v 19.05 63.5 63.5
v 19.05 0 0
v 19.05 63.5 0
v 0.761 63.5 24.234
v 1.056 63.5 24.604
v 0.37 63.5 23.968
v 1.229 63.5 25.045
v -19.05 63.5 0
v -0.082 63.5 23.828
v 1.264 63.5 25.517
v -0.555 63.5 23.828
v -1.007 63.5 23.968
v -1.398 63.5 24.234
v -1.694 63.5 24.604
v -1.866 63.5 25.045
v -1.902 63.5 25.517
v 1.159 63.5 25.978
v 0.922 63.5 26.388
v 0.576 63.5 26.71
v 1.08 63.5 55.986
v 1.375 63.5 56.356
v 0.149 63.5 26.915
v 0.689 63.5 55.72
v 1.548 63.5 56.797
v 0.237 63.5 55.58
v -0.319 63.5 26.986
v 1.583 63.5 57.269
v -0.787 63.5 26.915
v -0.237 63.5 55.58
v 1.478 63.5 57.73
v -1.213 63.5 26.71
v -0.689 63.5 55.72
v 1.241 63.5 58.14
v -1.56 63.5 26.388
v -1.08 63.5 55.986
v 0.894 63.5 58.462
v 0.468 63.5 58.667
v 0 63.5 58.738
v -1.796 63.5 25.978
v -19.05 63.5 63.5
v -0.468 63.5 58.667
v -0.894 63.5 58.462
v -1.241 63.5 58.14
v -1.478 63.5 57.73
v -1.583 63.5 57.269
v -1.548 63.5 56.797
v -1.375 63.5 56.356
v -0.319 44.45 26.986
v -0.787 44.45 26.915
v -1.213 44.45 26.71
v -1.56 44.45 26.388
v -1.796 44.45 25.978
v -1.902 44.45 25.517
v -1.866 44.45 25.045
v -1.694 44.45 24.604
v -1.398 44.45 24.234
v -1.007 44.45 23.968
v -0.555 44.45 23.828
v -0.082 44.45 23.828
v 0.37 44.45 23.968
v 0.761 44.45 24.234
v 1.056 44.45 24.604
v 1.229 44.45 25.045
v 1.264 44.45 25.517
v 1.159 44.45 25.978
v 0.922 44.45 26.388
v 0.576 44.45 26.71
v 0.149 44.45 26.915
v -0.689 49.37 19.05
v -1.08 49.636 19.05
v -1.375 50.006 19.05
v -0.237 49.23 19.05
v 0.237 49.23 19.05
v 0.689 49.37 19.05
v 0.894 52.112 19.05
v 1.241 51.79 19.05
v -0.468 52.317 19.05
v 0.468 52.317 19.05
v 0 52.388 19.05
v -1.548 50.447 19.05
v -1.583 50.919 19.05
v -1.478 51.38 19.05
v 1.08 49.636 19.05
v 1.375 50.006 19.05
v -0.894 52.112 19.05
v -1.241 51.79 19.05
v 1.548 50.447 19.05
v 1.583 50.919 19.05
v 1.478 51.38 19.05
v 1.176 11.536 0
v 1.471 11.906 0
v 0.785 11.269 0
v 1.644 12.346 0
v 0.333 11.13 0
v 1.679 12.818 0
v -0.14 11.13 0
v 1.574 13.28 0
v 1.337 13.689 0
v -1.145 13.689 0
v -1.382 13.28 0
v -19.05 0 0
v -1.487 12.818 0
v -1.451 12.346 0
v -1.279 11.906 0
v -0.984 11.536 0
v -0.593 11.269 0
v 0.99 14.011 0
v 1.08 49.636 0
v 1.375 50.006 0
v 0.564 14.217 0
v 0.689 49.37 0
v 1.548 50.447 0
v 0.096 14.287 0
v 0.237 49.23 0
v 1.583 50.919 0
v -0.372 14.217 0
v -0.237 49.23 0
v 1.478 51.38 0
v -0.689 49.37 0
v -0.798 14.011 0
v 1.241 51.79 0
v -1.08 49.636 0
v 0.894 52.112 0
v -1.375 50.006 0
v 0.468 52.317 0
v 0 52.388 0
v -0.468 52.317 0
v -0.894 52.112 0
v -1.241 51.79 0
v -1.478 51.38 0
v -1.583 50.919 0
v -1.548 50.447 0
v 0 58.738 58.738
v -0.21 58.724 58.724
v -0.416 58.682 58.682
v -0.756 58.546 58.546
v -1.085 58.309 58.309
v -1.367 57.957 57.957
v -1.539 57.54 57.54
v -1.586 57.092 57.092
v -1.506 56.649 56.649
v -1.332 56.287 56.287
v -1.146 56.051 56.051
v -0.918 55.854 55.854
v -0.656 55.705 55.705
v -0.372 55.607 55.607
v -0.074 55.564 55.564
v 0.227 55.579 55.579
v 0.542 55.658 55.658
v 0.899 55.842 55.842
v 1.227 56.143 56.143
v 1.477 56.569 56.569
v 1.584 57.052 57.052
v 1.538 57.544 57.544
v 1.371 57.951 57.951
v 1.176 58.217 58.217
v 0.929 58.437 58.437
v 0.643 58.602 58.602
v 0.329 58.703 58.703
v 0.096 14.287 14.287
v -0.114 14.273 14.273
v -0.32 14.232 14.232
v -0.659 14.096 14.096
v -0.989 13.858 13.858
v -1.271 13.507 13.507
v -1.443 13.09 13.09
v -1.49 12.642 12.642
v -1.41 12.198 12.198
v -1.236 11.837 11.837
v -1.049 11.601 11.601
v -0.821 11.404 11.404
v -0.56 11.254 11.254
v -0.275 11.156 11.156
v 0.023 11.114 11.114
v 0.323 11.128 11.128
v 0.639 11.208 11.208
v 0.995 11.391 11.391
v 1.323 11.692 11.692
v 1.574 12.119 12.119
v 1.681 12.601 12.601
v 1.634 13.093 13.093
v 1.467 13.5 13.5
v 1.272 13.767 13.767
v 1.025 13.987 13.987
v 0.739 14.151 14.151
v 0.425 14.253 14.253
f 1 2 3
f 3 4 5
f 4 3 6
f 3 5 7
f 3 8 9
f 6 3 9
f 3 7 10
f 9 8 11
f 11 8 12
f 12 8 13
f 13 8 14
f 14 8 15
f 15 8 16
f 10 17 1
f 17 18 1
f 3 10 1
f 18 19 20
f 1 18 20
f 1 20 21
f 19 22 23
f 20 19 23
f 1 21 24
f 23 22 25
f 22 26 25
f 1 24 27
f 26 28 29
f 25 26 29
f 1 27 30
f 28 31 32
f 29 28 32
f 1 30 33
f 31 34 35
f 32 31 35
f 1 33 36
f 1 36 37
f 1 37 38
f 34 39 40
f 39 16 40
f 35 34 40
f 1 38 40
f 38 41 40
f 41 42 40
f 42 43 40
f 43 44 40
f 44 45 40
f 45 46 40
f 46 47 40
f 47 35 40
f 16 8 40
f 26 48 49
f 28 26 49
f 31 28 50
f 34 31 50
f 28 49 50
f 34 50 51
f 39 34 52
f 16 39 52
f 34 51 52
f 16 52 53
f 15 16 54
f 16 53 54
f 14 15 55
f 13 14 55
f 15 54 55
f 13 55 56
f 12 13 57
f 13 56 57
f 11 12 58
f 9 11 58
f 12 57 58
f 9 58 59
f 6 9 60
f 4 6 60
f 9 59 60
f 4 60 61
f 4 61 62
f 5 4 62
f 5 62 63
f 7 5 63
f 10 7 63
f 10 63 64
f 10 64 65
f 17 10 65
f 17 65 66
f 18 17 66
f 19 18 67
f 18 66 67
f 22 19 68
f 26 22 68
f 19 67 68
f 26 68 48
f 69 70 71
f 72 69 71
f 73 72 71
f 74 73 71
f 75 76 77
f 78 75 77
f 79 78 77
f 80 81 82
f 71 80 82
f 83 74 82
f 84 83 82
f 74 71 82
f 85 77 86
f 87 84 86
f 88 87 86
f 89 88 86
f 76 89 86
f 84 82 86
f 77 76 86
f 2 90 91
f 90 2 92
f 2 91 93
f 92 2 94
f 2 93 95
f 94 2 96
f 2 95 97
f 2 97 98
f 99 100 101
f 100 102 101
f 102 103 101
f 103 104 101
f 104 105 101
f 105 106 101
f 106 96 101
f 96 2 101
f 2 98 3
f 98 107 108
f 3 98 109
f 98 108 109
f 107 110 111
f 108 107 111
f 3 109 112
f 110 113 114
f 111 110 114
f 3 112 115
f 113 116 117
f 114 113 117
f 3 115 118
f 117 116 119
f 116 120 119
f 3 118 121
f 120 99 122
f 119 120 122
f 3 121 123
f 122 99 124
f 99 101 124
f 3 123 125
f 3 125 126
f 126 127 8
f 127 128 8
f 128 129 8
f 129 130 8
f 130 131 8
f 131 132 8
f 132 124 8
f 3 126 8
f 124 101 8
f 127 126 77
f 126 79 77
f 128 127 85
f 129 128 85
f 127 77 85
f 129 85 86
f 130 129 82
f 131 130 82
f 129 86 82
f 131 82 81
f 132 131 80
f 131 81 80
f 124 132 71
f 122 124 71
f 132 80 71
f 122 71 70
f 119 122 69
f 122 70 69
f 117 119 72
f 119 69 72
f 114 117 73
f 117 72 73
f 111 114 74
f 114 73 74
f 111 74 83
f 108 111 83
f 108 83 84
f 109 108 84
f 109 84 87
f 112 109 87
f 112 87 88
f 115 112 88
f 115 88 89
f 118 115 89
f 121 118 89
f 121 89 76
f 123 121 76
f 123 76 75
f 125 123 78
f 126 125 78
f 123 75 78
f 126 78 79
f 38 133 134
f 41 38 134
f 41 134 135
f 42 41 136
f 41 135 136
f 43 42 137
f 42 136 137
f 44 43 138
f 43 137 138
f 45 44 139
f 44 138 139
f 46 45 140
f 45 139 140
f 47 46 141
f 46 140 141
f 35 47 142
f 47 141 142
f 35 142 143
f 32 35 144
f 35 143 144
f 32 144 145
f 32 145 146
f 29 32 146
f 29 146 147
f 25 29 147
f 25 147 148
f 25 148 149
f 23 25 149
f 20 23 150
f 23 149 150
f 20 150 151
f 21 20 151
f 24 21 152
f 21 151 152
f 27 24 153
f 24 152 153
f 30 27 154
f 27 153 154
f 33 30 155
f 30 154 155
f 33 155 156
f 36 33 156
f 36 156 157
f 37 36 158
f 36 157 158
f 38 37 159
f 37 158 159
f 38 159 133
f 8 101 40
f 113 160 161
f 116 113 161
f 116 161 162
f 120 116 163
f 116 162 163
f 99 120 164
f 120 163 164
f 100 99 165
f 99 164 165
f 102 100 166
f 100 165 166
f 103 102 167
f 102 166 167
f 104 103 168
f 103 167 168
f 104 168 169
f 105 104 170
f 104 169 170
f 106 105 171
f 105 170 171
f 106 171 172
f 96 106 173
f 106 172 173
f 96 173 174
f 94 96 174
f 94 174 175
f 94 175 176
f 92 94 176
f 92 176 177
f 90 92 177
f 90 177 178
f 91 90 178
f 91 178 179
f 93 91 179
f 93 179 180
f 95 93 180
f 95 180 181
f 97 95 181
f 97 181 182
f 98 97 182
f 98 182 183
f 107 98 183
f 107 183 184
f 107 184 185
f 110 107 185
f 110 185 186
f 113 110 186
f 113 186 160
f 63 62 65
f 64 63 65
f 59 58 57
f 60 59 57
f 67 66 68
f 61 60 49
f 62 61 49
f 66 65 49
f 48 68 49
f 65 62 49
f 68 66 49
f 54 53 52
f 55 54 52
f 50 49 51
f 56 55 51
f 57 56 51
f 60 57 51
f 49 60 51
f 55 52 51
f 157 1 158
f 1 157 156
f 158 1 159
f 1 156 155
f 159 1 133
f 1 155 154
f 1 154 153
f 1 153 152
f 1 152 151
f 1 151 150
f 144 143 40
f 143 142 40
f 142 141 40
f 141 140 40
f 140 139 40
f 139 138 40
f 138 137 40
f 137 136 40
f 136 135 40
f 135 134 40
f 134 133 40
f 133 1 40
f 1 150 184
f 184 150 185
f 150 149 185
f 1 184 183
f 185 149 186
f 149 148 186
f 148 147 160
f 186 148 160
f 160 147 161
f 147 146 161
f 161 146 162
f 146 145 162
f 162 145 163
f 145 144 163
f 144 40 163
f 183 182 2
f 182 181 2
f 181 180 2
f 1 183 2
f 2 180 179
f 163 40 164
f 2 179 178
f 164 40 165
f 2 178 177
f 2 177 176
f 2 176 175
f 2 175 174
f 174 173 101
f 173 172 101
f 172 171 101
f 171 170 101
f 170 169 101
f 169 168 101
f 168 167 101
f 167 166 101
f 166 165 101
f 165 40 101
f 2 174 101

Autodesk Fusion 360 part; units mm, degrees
sketch "Sketch1" plane through (0, 0, 0) normal (1, 0, 0) x (0, 1, 0)
  line L0 (0, 0) -> (63.5, 0)
  line L1 (63.5, 0) -> (63.5, 63.5)
  line L2 (63.5, 63.5) -> (0, 0)
  dimension "d1" = 63.5
extrude "Extrude1" add sketch "Sketch1" along normal mid plane 38.1
sketch "Sketch2" plane through (0, 0, 0) normal (0, 0, -1) x (1, 0, 0)
  line L0 (-19.05, -63.5) -> (19.05, -63.5)
  line L1 (19.05, -63.5) -> (19.05, 0)
  line L2 (19.05, 0) -> (-19.05, 0)
  line L3 (-19.05, 0) -> (-19.05, -63.5)
  circle A0 centre (0.0962, -12.6996) radius 6.8134
  circle A1 centre (0, -50.8) radius 6.965
  dimension "d10" = 12.7
  dimension "d11" = 12.7
sketch "Sketch3" plane through (0, 63.5, 0) normal (0, 1, 0) x (-1, 0, 0)
  line L0 (19.05, 63.5) -> (-19.05, 63.5)
  line L1 (-19.05, 63.5) -> (-19.05, 0)
  line L2 (-19.05, 0) -> (19.05, 0)
  line L3 (19.05, 0) -> (19.05, 63.5)
  circle A0 centre (0.3187, 25.398) radius 3.175
  circle A1 centre (0, 57.15) radius 3.175
  dimension "d12" = 25.4
  dimension "d13" = 6.35
  dimension "d14" = 6.35
  dimension "d15" = 6.35
hole "Hole3" at (0, 63.5, 57.15) at (-0.3187, 63.5, 25.398) direction (0, -1, 0) diameter 3.175 depth 19.05 tip angle 180
hole "Hole4" at (0, 50.8, 0) at (0.0962, 12.6996, 0) direction (0, 0, 1) diameter 3.175 depth 19.05 tip angle 180
equation "d17 = ( 1 / 8 ) * 1 in"
